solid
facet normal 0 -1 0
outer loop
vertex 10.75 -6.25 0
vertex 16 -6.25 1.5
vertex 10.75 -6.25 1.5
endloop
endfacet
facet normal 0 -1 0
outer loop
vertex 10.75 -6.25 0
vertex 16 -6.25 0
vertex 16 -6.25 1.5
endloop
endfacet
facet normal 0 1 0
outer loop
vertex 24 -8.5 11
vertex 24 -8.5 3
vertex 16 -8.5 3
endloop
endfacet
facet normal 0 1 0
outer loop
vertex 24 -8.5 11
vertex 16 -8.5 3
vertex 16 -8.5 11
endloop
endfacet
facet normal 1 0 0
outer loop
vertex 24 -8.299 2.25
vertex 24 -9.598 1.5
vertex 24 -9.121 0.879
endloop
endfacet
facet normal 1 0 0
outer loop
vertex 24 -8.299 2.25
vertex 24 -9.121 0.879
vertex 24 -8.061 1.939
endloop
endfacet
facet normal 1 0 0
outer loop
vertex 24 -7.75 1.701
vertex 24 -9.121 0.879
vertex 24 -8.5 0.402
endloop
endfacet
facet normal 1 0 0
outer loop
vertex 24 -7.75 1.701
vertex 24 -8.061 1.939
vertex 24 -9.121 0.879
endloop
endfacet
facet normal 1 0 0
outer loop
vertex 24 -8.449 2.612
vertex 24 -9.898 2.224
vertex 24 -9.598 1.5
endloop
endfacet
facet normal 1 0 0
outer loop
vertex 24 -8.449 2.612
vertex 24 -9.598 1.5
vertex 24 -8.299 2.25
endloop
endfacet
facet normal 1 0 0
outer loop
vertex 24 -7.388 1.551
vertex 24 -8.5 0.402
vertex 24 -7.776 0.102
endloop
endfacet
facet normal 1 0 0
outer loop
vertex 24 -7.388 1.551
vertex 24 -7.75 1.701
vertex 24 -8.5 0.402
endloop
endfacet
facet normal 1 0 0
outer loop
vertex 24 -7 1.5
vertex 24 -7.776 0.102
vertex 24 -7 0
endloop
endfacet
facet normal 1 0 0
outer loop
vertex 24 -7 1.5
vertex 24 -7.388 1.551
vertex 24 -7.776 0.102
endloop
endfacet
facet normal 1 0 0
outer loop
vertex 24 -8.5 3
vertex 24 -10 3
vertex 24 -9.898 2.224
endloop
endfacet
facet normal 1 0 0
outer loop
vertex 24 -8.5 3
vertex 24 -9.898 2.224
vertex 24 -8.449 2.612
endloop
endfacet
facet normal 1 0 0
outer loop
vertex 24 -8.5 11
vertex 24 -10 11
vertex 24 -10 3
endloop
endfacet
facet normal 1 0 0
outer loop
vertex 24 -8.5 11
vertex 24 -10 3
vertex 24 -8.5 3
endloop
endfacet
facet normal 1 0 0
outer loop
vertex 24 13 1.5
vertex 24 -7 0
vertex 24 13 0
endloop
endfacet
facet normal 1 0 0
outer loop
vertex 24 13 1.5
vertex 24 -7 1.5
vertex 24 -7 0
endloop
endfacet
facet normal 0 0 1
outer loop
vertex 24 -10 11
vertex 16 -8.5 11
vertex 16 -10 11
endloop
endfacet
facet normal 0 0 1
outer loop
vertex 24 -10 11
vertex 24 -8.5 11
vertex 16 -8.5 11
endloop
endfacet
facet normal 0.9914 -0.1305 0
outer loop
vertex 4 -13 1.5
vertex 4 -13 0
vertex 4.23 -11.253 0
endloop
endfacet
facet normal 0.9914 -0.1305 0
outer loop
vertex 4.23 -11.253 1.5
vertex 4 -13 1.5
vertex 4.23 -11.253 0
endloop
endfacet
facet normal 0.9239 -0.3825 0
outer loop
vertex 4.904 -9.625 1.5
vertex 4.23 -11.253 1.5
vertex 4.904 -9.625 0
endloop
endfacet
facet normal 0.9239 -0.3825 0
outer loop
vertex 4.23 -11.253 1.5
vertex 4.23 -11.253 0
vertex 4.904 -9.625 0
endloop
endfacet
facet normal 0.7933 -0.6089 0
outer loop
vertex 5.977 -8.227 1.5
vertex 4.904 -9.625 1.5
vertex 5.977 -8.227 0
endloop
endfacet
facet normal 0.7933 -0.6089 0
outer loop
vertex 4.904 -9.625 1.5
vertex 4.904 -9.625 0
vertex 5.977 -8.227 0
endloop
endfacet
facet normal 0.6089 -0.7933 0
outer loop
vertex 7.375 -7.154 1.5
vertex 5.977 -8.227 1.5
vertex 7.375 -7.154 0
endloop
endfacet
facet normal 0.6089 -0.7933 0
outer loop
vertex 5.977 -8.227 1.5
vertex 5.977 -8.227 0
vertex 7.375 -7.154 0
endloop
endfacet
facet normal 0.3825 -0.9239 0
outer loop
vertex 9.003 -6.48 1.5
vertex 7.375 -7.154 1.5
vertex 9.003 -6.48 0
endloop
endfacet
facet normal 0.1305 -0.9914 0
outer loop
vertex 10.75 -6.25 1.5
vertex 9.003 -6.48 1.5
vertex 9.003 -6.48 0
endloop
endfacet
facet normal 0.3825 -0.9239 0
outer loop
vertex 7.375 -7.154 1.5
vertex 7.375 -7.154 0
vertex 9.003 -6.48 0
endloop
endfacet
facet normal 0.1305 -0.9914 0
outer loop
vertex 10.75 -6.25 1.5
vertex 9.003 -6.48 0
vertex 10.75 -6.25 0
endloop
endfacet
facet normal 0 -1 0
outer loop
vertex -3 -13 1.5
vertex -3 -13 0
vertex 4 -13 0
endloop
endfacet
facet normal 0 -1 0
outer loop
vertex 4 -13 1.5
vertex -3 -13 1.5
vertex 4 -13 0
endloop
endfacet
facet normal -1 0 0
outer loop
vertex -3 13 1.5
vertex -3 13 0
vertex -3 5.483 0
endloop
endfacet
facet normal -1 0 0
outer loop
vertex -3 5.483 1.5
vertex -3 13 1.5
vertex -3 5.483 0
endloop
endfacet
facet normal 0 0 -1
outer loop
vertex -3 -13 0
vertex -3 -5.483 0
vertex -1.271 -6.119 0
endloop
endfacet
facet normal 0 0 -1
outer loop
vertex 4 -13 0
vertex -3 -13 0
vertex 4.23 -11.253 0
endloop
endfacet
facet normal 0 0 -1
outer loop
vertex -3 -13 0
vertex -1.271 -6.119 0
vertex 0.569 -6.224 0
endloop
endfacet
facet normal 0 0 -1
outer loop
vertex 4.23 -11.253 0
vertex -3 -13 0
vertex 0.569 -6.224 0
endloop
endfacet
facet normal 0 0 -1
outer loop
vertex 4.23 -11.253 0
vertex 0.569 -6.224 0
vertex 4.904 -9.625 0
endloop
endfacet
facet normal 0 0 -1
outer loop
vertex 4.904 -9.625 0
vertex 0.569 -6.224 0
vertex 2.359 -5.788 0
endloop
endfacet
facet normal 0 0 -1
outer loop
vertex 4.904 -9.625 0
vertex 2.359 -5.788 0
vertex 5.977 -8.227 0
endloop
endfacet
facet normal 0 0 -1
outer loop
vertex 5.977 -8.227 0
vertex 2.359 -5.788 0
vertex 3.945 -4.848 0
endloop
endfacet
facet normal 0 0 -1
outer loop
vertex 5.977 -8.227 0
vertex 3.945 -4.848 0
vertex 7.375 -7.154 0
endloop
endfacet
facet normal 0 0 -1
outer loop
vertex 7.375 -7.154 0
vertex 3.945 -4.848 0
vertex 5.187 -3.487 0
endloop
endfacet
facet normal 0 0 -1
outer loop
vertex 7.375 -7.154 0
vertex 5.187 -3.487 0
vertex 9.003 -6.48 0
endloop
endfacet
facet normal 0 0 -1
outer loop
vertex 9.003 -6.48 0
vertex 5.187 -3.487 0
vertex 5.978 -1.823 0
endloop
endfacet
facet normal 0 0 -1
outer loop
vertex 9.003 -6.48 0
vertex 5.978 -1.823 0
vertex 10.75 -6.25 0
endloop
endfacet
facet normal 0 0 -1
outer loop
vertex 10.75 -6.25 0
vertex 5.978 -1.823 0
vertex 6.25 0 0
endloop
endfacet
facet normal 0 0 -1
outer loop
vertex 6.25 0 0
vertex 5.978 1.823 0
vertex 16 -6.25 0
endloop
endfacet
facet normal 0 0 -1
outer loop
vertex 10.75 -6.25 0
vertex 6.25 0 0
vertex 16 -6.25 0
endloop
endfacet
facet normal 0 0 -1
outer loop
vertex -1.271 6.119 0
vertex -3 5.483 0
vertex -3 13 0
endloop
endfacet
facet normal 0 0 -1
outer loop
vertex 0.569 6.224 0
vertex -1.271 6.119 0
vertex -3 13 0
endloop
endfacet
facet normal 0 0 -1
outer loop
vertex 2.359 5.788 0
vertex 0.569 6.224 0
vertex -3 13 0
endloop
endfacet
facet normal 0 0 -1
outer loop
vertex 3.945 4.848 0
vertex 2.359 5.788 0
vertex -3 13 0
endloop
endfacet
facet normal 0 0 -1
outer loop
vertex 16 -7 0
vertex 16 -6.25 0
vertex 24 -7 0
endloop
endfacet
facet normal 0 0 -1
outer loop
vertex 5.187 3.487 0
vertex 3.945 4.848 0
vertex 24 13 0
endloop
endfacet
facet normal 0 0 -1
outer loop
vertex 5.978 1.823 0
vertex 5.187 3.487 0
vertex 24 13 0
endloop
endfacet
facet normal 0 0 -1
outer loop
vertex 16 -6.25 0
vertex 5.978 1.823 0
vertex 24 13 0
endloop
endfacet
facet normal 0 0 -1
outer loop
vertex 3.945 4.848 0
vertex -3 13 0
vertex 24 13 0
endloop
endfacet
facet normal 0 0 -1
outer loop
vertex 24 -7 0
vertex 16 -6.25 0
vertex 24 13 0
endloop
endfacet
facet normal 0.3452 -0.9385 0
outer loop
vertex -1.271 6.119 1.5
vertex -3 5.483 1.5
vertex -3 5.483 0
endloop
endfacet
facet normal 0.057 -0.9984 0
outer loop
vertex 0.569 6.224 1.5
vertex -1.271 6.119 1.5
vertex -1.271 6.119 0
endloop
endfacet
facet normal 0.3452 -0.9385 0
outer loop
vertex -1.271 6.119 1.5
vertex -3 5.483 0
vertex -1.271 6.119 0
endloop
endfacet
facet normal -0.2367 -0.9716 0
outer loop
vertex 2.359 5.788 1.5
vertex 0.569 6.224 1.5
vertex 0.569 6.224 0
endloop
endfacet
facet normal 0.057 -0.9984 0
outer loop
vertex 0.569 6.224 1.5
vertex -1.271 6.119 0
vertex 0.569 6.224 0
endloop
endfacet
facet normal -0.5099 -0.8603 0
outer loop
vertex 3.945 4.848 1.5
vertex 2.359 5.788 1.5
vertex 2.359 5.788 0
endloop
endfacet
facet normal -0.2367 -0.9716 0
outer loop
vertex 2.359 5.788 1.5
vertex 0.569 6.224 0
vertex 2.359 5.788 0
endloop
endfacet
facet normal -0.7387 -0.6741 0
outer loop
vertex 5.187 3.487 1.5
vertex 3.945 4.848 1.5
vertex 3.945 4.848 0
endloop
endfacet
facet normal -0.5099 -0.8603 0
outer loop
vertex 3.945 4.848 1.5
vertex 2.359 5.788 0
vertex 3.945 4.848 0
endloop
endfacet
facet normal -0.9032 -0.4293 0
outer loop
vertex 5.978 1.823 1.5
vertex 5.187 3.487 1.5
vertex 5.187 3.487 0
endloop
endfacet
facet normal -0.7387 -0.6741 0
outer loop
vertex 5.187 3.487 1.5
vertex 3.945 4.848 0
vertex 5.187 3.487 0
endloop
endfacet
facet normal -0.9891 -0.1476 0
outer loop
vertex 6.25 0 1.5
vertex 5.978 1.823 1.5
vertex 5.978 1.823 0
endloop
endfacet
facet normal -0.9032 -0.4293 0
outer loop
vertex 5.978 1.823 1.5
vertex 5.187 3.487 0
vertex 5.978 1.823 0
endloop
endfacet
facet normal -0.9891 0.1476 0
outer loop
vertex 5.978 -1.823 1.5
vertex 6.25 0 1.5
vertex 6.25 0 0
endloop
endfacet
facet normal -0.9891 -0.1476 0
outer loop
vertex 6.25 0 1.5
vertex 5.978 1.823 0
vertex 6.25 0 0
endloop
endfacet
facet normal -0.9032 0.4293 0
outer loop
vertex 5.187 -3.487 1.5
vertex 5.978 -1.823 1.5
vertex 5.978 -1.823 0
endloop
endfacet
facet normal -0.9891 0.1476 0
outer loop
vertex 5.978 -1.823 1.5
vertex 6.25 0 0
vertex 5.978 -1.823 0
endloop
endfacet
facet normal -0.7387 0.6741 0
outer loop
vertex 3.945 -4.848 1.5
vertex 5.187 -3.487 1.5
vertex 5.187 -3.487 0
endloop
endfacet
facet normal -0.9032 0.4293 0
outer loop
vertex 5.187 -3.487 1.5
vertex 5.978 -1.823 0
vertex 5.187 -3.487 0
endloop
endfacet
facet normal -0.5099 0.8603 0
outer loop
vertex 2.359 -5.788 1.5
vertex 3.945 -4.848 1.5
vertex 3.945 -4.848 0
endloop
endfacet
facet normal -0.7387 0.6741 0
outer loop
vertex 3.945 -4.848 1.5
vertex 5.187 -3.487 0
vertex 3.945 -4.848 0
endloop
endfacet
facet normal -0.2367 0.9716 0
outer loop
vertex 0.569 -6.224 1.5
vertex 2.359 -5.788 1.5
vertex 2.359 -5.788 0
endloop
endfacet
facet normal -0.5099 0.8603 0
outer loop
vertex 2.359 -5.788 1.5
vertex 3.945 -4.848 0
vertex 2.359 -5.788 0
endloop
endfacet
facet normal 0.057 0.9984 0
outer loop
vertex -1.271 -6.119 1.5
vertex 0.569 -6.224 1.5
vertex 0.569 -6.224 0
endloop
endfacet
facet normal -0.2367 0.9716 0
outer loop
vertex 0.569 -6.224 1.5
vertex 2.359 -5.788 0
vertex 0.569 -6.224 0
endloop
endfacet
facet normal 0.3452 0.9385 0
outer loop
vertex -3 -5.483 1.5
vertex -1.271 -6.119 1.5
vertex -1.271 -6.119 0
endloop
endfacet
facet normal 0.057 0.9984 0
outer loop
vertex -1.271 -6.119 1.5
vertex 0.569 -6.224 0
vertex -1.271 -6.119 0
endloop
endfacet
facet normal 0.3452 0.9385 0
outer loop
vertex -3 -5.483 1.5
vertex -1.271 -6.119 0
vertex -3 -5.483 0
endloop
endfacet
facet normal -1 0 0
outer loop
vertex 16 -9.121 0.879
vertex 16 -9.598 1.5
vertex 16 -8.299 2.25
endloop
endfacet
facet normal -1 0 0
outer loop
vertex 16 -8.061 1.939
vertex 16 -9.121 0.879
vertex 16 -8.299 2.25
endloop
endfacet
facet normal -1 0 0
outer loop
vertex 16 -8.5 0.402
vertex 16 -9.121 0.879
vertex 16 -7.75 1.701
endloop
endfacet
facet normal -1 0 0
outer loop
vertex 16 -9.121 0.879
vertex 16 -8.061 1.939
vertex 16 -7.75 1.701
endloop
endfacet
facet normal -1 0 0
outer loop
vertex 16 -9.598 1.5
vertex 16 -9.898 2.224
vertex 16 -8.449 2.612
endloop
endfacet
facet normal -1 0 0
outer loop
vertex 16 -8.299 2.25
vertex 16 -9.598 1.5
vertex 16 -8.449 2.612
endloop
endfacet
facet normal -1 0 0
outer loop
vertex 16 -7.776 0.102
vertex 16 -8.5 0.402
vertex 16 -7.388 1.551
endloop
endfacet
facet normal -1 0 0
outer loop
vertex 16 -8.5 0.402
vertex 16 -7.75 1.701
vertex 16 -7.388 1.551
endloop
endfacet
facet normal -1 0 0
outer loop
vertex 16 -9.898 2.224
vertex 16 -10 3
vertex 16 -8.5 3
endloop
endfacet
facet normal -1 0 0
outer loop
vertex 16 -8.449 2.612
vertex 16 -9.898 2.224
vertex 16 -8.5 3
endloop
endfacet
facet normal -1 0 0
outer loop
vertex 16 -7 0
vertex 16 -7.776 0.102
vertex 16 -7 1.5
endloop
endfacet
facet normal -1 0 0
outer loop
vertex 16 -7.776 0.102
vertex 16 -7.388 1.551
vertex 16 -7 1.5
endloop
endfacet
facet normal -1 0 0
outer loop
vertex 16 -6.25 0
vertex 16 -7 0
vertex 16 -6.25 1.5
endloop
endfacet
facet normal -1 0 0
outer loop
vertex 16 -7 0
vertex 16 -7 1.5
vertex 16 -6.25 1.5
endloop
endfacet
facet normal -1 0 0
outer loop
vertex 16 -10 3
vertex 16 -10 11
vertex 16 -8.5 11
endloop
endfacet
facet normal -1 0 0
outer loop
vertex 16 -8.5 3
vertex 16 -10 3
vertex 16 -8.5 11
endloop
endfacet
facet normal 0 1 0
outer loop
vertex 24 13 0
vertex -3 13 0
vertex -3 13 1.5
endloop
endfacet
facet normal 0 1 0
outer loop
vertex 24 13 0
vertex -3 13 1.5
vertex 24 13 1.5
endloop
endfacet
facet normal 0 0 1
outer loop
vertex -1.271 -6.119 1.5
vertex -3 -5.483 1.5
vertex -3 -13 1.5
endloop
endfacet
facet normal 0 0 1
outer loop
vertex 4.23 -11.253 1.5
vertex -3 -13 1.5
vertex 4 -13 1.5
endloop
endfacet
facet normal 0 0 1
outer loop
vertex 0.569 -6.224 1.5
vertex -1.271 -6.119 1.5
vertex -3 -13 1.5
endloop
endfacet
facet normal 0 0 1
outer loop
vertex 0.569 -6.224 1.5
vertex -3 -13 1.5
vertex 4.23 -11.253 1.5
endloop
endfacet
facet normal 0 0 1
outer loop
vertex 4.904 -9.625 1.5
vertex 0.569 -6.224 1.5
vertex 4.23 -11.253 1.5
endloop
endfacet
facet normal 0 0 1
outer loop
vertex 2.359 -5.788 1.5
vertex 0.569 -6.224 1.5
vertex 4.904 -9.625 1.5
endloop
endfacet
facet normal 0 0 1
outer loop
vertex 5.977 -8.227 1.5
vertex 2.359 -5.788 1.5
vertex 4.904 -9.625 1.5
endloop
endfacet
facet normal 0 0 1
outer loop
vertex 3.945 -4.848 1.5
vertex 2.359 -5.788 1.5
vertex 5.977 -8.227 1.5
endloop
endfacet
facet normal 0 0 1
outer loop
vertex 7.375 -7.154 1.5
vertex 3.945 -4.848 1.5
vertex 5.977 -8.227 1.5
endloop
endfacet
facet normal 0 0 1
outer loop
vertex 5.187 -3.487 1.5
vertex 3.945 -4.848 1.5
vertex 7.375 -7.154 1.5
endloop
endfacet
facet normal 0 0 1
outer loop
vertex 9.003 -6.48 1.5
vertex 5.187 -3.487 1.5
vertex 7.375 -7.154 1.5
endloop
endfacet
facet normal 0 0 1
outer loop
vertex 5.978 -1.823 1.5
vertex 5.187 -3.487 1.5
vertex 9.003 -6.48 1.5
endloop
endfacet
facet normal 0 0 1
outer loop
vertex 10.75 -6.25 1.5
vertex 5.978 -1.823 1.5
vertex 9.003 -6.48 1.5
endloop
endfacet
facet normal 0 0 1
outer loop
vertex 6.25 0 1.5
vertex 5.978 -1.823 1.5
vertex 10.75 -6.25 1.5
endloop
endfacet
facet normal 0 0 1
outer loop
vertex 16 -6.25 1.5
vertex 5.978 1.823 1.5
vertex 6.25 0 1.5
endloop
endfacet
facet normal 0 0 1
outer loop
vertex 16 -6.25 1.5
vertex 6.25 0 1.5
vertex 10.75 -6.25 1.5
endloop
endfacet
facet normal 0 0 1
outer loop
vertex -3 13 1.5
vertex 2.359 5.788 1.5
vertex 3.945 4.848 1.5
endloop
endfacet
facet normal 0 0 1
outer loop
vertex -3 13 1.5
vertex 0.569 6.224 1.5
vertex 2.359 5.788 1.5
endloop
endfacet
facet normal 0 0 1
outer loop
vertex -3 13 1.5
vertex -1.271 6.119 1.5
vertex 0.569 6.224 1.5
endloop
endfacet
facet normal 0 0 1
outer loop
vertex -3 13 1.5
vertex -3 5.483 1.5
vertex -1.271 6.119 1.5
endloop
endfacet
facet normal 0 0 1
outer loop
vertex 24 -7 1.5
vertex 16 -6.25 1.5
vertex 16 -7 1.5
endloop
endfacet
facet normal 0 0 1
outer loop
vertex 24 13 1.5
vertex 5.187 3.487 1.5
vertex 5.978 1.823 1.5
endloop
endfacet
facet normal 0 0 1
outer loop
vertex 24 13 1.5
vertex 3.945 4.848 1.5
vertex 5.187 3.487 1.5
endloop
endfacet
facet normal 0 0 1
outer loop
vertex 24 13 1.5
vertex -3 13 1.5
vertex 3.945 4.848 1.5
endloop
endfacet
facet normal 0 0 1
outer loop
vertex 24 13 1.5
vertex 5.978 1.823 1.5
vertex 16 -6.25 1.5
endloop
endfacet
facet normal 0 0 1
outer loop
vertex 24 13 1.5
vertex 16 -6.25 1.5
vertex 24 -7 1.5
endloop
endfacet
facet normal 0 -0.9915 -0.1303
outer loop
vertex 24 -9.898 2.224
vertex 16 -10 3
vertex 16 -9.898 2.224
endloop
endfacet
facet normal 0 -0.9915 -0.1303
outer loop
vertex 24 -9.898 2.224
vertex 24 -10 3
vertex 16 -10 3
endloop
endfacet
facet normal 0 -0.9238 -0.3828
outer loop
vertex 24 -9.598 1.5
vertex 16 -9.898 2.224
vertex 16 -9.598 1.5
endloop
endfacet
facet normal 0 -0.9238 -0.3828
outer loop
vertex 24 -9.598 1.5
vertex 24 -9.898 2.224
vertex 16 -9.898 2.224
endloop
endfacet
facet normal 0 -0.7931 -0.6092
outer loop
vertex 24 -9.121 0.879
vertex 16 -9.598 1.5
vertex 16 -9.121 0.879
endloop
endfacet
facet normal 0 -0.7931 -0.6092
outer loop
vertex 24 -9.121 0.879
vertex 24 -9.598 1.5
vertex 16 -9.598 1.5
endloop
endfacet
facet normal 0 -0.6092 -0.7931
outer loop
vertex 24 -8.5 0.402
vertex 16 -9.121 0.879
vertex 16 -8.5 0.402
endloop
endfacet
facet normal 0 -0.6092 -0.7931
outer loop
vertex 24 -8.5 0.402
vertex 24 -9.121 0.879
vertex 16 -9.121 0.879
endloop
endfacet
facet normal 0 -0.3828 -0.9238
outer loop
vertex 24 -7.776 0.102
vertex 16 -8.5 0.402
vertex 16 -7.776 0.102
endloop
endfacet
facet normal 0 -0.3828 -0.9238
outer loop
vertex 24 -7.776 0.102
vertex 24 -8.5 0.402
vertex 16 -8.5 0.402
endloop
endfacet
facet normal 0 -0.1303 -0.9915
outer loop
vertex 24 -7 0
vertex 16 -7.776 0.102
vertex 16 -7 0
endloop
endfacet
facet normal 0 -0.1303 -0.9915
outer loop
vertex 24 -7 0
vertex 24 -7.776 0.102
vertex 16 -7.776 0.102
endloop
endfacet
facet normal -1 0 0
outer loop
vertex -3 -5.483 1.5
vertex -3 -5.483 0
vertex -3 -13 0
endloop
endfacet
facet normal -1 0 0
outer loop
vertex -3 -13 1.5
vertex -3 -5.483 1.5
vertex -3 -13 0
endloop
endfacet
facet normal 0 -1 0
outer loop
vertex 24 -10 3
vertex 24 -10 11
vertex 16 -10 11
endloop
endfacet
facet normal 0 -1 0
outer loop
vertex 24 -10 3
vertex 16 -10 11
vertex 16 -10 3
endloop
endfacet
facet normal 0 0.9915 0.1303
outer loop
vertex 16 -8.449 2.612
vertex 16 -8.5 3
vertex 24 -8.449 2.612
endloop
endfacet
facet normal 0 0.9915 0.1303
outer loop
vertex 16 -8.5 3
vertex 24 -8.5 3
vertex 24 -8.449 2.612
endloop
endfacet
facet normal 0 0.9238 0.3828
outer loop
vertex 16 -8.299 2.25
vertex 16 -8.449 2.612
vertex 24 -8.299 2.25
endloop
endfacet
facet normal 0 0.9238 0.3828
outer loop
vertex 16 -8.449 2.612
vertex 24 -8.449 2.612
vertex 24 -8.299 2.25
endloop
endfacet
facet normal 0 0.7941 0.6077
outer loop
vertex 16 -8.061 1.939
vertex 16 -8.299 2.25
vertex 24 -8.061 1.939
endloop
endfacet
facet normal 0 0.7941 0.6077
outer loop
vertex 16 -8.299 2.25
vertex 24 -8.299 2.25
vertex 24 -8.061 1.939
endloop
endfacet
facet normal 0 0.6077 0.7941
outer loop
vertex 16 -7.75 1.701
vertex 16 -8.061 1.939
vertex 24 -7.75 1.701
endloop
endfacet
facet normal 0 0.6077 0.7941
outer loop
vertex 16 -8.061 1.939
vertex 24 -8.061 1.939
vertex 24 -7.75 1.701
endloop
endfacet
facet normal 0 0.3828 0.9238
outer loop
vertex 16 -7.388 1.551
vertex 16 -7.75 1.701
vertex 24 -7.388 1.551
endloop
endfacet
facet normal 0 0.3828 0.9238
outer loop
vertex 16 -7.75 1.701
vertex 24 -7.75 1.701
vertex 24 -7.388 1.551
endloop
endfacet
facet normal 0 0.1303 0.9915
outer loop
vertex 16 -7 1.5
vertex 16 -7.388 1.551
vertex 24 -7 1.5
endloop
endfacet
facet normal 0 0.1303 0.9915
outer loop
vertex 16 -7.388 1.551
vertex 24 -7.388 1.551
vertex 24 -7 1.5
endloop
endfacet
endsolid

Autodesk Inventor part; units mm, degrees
ref_plane "YZ Plane" through (0, 0, 0) normal (1, 0, 0) x (0, 1, 0)
ref_plane "XZ Plane" through (0, 0, 0) normal (0, 1, 0) x (-1, 0, 0)
ref_plane "XY Plane" through (0, 0, 0) normal (0, 0, 1) x (1, 0, 0)
sketch "スケッチ1" plane through (0, 0, 0) normal (0, 0, 1) x (1, 0, 0)
  circle A0 centre (0, 0) radius 6.25
  line L0 (0, 13) -> (24, 13)
  line L1 (24, 13) -> (24, -13)
  line L2 (24, -13) -> (0, -13)
  line L3 (0, -13) -> (0, 13)
  line L4 (0, 13) -> (-3, 13)
  line L5 (-3, 13) -> (-3, -13)
  line L6 (-3, -13) -> (0, -13)
  line L7 (0, -13) -> (0, 13)
  line L8 (16, -13) -> (16, -6.25)
  line L9 (16, -6.25) -> (0, -6.25)
  line L10 (-3, -10) -> (24, -10)
  arc A1 (10.75, -6.25) -> (4, -13) centre (10.75, -13) ccw
  line L11 (4, -13) -> (4, -9.651) construction
  point P0 (24, 0)
  point P1 (-3, 5.4829)
  point P2 (-3, -5.4829)
  point P3 (0, 0)
  point P4 (16, -10)
  point P5 (4.7033, -10)
  dimension "d0" = 12.5
  dimension "d1" = 24
  dimension "d2" = 26
  dimension "d3" = 3
  dimension "d5" = 8
  dimension "d16" = 3
  dimension "d17" = 7
extrude "プレート1" add sketch "スケッチ1" along normal blind 1.5 contours L3 L10 L5 A0 | L9 A1 L10 L3 | A0 L3 L0 L1 L10 L8 L9 | L10 A1 L2 L3 | L3 L6 L5 L10 | A0 L5 L4 L3
sketch "スケッチ2" plane through (24, -8.5, 0) normal (0, -1, 0) x (1, 0, 0)
  line L0 (-8, 0) -> (0, 0)
  line L1 (0, 0) -> (0, 11)
  line L2 (0, 11) -> (-8, 11)
  line L3 (-8, 11) -> (-8, 0)
edge flange "フランジ1" height 11 angle 90 thickness 1.5 bend radius 1.5 thickness toward (0, -1, 0) relief tear relief width 1.5 relief depth 0.75 edges at (20, -10, 1.5) wall of the first edge with corners at (16, -8.5, 0) (24, -8.5, 0) (24, -8.5, 11) (16, -8.5, 11)
bend "曲げ1"
corner "コーナー1"
equation "\"d4\" = Thickness"
equation "\"d6\" = BendReliefWidth"
equation "\"d7\" = BendReliefDepth"
equation "\"d8\" = MinimumRemnant"
equation "\"d9\" = TransitionRadius"
equation "\"d12\" = BendRadius"
equation "\"d13\" = CornerReliefSize"
equation "\"d14\" = GapSize"
equation "\"d15\" = JacobiRadiusSize"
equation "\"BendRadius\" = Thickness"
equation "\"BendReliefWidth\" = Thickness"
equation "\"BendReliefDepth\" = 0.5 * Thickness"
equation "\"CornerReliefSize\" = 4 * Thickness"
equation "\"MinimumRemnant\" = 2 * Thickness"
equation "\"TransitionRadius\" = BendRadius"
equation "\"JacobiRadiusSize\" = BendRadius"
equation "\"GapSize\" = Thickness"
equation "\"Thickness\" = 1.5"
properties part number "hipjoint_toleg_under_up_right"
